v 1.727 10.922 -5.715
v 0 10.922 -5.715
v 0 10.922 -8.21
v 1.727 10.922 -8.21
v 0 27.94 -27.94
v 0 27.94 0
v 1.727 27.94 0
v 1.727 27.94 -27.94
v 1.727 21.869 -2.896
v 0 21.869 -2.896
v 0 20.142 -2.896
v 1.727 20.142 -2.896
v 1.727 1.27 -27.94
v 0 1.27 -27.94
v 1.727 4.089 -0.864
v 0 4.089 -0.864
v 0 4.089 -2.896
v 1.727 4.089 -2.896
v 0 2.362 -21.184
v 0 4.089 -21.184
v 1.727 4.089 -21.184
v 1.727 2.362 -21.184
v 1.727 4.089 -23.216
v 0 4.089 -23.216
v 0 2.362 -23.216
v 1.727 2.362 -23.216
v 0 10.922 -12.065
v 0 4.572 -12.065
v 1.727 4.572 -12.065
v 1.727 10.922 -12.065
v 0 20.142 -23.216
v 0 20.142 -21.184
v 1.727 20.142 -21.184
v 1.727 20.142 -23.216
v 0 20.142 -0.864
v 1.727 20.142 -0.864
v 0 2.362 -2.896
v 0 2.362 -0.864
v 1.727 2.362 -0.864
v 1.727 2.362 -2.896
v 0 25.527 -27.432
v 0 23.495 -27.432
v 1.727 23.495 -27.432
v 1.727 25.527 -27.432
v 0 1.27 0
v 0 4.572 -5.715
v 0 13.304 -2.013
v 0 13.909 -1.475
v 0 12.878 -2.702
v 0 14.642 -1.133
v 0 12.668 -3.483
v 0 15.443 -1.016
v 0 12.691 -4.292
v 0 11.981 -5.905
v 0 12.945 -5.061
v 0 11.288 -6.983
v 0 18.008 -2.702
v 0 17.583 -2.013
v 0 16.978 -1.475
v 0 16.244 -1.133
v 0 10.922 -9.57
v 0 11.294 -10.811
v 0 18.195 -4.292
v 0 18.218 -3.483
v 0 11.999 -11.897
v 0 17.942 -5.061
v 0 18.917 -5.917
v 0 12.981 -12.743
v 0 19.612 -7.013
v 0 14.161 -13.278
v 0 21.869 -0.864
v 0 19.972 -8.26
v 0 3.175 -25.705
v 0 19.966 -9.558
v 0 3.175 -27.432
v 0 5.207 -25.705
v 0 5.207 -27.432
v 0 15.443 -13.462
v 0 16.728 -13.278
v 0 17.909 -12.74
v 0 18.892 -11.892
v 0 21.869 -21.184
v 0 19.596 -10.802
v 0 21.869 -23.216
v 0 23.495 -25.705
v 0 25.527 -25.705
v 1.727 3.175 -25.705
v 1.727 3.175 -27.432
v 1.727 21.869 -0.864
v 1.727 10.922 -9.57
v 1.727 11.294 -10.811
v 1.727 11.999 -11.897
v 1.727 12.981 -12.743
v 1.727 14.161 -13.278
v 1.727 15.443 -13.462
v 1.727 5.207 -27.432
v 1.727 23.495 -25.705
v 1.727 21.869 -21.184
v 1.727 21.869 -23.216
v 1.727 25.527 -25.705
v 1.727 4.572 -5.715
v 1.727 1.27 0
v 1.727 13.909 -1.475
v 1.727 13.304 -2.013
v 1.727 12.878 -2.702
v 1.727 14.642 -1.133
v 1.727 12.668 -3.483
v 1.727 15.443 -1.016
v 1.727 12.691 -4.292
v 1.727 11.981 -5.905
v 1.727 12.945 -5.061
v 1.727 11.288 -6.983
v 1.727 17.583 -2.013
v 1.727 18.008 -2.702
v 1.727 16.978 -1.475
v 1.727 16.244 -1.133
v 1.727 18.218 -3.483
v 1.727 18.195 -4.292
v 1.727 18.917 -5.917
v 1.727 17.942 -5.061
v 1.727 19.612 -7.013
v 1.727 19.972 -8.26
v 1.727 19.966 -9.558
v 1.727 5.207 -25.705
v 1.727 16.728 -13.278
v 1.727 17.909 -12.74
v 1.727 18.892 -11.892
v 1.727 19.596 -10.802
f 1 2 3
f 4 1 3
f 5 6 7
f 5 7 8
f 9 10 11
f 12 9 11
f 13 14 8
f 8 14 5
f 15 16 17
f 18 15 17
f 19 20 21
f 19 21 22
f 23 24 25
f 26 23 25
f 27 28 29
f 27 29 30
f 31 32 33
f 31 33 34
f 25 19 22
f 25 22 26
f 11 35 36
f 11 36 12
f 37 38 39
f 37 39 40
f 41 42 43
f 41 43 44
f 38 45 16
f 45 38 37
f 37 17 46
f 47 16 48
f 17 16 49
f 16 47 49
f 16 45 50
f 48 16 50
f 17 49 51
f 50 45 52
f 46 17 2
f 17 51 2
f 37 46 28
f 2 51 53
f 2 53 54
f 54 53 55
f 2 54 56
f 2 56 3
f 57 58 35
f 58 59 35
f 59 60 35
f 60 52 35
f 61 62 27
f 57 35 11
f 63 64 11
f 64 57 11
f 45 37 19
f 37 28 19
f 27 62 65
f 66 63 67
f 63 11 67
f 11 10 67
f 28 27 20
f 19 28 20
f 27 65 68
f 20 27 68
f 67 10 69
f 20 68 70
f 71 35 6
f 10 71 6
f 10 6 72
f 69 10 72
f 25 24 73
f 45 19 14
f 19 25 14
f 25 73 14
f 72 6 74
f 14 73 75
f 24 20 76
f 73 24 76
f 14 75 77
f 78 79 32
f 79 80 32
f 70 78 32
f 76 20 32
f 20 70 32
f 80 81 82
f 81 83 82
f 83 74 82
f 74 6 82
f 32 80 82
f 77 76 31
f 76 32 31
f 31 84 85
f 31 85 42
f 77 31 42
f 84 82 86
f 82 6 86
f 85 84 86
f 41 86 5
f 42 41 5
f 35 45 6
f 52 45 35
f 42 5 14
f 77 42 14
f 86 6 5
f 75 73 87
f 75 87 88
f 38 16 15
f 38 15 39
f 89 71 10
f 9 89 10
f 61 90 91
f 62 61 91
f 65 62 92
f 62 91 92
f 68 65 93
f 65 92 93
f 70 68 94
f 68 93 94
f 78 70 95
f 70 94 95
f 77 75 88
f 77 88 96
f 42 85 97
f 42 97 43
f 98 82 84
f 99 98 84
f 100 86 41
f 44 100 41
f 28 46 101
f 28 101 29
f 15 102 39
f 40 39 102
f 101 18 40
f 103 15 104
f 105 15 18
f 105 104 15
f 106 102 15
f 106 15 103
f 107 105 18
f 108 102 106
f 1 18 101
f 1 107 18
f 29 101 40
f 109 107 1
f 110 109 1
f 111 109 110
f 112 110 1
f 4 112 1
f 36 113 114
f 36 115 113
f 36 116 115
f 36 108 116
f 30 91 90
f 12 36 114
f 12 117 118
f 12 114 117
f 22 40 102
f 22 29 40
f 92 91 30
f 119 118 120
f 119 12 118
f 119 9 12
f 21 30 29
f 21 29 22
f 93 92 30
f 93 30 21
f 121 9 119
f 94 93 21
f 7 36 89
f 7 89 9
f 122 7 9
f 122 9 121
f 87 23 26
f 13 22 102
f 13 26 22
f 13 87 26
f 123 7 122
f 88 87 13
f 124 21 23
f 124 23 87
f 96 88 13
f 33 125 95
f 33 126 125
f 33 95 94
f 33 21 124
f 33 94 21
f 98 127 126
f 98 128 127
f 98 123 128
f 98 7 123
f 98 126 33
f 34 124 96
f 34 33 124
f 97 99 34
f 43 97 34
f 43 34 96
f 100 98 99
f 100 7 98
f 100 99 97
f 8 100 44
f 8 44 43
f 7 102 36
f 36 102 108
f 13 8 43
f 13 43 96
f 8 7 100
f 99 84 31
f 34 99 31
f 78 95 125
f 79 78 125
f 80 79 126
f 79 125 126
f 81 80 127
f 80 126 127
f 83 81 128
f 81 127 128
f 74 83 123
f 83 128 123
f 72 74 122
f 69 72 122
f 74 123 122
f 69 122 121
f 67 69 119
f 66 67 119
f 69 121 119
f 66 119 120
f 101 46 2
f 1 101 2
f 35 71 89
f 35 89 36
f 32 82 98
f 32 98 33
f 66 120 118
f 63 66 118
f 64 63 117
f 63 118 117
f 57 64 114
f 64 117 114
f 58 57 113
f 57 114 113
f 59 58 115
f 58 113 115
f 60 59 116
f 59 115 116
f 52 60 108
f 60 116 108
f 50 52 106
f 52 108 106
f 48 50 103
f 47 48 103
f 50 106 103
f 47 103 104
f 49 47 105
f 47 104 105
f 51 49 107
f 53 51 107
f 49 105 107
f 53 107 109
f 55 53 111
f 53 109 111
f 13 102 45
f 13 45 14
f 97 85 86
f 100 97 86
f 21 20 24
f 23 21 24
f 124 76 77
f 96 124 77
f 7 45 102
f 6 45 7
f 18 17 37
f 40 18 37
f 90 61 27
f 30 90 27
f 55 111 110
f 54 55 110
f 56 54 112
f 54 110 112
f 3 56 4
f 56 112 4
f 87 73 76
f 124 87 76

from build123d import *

# Parameters (mm, degrees)
SKETCH1_W           = 27.94
SKETCH1_H           = 27.94
SKETCH1_W_2         = 6.35
SKETCH1_H_2         = 6.35
SKETCH1_W_3         = 1.7272
SKETCH1_H_3         = 2.032
BOSS_EXTRUDE1_DEPTH = 1.7272
SKETCH4_R           = 4.572
SKETCH4_R_2         = 2.794
CUT_EXTRUDE4_DEPTH  = 1.7272
SKETCH8_W           = 1.7272
SKETCH8_H           = 2.032
CUT_EXTRUDE5_DEPTH  = 1.7272
SKETCH9_W           = 1.7272
SKETCH9_H           = 2.032
CUT_EXTRUDE6_DEPTH  = 1.7272
SKETCH10_W          = 27.94
SKETCH10_H          = 1.27
CUT_EXTRUDE7_DEPTH  = 1.7272


with BuildPart() as part:
    # Sketch1 → Boss-Extrude1 (new body)
    with BuildSketch(Plane(origin=(0, 0, 0), x_dir=(0, 0, -1), z_dir=(1, 0, 0))):
        with Locations((13.97, 13.97)):
            Rectangle(SKETCH1_W, SKETCH1_H)
        with Locations((8.89, 7.747)):
            Rectangle(SKETCH1_W_2, SKETCH1_H_2, mode=Mode.SUBTRACT)
        with Locations((26.5684, 4.191)):
            Rectangle(SKETCH1_W_3, SKETCH1_H_3, mode=Mode.SUBTRACT)
        with Locations((26.5684, 24.511)):
            Rectangle(SKETCH1_W_3, SKETCH1_H_3, mode=Mode.SUBTRACT)
    extrude(amount=BOSS_EXTRUDE1_DEPTH)

    # Sketch4 → Cut-Extrude4 (cut)
    with BuildSketch(Plane(origin=(1.7272, 0, 0), x_dir=(0, 0, -1), z_dir=(1, 0, 0))):
        with BuildLine():
            ThreePointArc((9.569657679, 10.922), (12.354864998, 12.460266118), (13.462, 15.4432))
            ThreePointArc((13.462, 15.4432), (10.193220511, 19.825528183), (5.06095, 17.941511449))
            ThreePointArc((5.06095, 17.941511449), (6.18714012, 16.911410084), (6.604, 15.4432))
            ThreePointArc((6.604, 15.4432), (6.18714012, 13.974989916), (5.06095, 12.944888551))
            ThreePointArc((5.06095, 12.944888551), (6.41914372, 11.596376213), (8.210342321, 10.922))
            Line((8.210342321, 10.922), (9.569657679, 10.922))
        make_face()
        with Locations((8.89, 15.4432)):
            Circle(SKETCH4_R)
        with Locations((3.81, 15.4432)):
            Circle(SKETCH4_R_2)
    extrude(amount=-CUT_EXTRUDE4_DEPTH, mode=Mode.SUBTRACT)

    # Sketch8 → Cut-Extrude5 (cut)
    with BuildSketch(Plane(origin=(0, 20.1422, 3.5052), x_dir=(0, -1, 0), z_dir=(1, 0, 0))):
        with Locations((-0.8636, 25.7048)):
            Rectangle(SKETCH8_W, SKETCH8_H)
        with Locations((-0.8636, 5.3848)):
            Rectangle(SKETCH8_W, SKETCH8_H)
    extrude(amount=CUT_EXTRUDE5_DEPTH, mode=Mode.SUBTRACT)

    # Sketch9 → Cut-Extrude6 (cut)
    with BuildSketch(Plane(origin=(0, 2.3622, 3.5052), x_dir=(0, -1, 0), z_dir=(1, 0, 0))):
        with Locations((-0.8636, 25.7048)):
            Rectangle(SKETCH9_W, SKETCH9_H)
        with Locations((-0.8636, 5.3848)):
            Rectangle(SKETCH9_W, SKETCH9_H)
    extrude(amount=CUT_EXTRUDE6_DEPTH, mode=Mode.SUBTRACT)

    # Sketch10 → Cut-Extrude7 (cut)
    with BuildSketch(Plane(origin=(1.7272, 0, 0), x_dir=(0, 0, -1), z_dir=(1, 0, 0))):
        with Locations((13.97, 0.635)):
            Rectangle(SKETCH10_W, SKETCH10_H)
    extrude(amount=-CUT_EXTRUDE7_DEPTH, mode=Mode.SUBTRACT)


solid = part.part
